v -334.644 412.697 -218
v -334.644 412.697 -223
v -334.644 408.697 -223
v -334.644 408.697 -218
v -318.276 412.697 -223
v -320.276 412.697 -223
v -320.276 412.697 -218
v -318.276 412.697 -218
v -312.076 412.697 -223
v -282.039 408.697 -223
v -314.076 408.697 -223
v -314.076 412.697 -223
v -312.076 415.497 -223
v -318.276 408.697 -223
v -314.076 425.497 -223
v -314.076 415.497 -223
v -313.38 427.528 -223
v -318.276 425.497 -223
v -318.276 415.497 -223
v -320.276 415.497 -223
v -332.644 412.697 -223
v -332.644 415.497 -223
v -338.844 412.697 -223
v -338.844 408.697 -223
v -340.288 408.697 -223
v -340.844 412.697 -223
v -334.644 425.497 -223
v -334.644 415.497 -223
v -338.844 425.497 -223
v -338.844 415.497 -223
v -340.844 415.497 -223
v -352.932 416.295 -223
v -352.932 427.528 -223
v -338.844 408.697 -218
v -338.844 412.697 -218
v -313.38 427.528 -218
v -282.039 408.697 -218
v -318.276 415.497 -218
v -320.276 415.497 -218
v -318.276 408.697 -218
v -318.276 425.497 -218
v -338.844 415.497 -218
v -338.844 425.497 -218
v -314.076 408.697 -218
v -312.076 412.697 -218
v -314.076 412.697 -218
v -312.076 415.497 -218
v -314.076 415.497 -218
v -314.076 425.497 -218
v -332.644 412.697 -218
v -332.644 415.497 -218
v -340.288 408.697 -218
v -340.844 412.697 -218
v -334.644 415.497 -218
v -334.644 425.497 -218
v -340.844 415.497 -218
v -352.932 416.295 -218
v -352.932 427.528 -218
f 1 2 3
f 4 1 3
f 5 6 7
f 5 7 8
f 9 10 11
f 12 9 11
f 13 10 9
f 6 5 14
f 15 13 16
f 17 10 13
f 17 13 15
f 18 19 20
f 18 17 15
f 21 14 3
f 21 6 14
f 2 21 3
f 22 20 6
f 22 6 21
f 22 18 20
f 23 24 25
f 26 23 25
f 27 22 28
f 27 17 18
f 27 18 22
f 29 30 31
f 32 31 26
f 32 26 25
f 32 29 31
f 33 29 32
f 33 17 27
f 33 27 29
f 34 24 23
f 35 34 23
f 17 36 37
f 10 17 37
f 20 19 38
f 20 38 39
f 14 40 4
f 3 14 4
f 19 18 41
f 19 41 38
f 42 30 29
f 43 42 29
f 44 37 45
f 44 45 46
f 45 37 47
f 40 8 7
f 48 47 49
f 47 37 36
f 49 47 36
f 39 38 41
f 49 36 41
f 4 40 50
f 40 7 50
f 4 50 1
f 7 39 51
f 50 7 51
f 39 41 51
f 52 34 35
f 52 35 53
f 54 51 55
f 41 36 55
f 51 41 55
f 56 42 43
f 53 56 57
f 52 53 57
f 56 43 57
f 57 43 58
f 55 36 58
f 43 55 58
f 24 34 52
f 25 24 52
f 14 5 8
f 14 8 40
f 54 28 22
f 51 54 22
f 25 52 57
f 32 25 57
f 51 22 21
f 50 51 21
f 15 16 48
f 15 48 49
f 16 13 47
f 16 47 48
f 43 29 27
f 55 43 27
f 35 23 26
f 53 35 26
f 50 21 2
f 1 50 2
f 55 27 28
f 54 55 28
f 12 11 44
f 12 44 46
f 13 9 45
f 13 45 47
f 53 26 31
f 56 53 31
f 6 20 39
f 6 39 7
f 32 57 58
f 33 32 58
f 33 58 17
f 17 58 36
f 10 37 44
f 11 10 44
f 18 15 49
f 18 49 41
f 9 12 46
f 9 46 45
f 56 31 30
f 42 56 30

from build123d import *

# Parameters (mm, degrees)
BOSS_EXTRUDE1_DEPTH     = 5
CUT_EXTRUDE1_DEPTH      = 1
CUT_EXTRUDE1_DEPTH_BACK = 6


with BuildPart() as part:
    # Sketch3 → Boss-Extrude1 (new body)
    with BuildSketch(Plane.XY.offset(-218.000000001)):
        Polygon((-282.039404117, 408.696835159), (-340.287524909, 408.696835159), (-352.932442284, 416.294668041), (-352.932442284, 427.528407952), (-313.380404337, 427.528407952), align=None)
    extrude(amount=-BOSS_EXTRUDE1_DEPTH)

    # Sketch4 → Cut-Extrude1 (cut, two sides)
    with BuildSketch(Plane(origin=(0, 0, -223.000000001), x_dir=(-1, 0, 0), z_dir=(0, 0, -1))) as cut_extrude1_sk:
        Polygon((318.275750374, 408.696835159), (314.075750374, 408.696835159), (314.075750374, 412.696835159), (312.075750374, 412.696835159), (312.075750374, 415.496835159), (314.075750374, 415.496835159), (314.075750374, 425.496835159), (318.275750374, 425.496835159), (318.275750374, 415.496835159), (320.275750374, 415.496835159), (320.275750374, 412.696835159), (318.275750374, 412.696835159), align=None)
        Polygon((338.843972624, 412.696835159), (340.843972624, 412.696835159), (340.843972624, 415.496835159), (338.843972624, 415.496835159), (338.843972624, 425.496835159), (334.643972624, 425.496835159), (334.643972624, 415.496835159), (332.643972624, 415.496835159), (332.643972624, 412.696835159), (334.643972624, 412.696835159), (334.643972624, 408.696835159), (338.843972624, 408.696835159), align=None)
    extrude(amount=CUT_EXTRUDE1_DEPTH, mode=Mode.SUBTRACT)
    extrude(cut_extrude1_sk.sketch, amount=-CUT_EXTRUDE1_DEPTH_BACK, mode=Mode.SUBTRACT)


solid = part.part
